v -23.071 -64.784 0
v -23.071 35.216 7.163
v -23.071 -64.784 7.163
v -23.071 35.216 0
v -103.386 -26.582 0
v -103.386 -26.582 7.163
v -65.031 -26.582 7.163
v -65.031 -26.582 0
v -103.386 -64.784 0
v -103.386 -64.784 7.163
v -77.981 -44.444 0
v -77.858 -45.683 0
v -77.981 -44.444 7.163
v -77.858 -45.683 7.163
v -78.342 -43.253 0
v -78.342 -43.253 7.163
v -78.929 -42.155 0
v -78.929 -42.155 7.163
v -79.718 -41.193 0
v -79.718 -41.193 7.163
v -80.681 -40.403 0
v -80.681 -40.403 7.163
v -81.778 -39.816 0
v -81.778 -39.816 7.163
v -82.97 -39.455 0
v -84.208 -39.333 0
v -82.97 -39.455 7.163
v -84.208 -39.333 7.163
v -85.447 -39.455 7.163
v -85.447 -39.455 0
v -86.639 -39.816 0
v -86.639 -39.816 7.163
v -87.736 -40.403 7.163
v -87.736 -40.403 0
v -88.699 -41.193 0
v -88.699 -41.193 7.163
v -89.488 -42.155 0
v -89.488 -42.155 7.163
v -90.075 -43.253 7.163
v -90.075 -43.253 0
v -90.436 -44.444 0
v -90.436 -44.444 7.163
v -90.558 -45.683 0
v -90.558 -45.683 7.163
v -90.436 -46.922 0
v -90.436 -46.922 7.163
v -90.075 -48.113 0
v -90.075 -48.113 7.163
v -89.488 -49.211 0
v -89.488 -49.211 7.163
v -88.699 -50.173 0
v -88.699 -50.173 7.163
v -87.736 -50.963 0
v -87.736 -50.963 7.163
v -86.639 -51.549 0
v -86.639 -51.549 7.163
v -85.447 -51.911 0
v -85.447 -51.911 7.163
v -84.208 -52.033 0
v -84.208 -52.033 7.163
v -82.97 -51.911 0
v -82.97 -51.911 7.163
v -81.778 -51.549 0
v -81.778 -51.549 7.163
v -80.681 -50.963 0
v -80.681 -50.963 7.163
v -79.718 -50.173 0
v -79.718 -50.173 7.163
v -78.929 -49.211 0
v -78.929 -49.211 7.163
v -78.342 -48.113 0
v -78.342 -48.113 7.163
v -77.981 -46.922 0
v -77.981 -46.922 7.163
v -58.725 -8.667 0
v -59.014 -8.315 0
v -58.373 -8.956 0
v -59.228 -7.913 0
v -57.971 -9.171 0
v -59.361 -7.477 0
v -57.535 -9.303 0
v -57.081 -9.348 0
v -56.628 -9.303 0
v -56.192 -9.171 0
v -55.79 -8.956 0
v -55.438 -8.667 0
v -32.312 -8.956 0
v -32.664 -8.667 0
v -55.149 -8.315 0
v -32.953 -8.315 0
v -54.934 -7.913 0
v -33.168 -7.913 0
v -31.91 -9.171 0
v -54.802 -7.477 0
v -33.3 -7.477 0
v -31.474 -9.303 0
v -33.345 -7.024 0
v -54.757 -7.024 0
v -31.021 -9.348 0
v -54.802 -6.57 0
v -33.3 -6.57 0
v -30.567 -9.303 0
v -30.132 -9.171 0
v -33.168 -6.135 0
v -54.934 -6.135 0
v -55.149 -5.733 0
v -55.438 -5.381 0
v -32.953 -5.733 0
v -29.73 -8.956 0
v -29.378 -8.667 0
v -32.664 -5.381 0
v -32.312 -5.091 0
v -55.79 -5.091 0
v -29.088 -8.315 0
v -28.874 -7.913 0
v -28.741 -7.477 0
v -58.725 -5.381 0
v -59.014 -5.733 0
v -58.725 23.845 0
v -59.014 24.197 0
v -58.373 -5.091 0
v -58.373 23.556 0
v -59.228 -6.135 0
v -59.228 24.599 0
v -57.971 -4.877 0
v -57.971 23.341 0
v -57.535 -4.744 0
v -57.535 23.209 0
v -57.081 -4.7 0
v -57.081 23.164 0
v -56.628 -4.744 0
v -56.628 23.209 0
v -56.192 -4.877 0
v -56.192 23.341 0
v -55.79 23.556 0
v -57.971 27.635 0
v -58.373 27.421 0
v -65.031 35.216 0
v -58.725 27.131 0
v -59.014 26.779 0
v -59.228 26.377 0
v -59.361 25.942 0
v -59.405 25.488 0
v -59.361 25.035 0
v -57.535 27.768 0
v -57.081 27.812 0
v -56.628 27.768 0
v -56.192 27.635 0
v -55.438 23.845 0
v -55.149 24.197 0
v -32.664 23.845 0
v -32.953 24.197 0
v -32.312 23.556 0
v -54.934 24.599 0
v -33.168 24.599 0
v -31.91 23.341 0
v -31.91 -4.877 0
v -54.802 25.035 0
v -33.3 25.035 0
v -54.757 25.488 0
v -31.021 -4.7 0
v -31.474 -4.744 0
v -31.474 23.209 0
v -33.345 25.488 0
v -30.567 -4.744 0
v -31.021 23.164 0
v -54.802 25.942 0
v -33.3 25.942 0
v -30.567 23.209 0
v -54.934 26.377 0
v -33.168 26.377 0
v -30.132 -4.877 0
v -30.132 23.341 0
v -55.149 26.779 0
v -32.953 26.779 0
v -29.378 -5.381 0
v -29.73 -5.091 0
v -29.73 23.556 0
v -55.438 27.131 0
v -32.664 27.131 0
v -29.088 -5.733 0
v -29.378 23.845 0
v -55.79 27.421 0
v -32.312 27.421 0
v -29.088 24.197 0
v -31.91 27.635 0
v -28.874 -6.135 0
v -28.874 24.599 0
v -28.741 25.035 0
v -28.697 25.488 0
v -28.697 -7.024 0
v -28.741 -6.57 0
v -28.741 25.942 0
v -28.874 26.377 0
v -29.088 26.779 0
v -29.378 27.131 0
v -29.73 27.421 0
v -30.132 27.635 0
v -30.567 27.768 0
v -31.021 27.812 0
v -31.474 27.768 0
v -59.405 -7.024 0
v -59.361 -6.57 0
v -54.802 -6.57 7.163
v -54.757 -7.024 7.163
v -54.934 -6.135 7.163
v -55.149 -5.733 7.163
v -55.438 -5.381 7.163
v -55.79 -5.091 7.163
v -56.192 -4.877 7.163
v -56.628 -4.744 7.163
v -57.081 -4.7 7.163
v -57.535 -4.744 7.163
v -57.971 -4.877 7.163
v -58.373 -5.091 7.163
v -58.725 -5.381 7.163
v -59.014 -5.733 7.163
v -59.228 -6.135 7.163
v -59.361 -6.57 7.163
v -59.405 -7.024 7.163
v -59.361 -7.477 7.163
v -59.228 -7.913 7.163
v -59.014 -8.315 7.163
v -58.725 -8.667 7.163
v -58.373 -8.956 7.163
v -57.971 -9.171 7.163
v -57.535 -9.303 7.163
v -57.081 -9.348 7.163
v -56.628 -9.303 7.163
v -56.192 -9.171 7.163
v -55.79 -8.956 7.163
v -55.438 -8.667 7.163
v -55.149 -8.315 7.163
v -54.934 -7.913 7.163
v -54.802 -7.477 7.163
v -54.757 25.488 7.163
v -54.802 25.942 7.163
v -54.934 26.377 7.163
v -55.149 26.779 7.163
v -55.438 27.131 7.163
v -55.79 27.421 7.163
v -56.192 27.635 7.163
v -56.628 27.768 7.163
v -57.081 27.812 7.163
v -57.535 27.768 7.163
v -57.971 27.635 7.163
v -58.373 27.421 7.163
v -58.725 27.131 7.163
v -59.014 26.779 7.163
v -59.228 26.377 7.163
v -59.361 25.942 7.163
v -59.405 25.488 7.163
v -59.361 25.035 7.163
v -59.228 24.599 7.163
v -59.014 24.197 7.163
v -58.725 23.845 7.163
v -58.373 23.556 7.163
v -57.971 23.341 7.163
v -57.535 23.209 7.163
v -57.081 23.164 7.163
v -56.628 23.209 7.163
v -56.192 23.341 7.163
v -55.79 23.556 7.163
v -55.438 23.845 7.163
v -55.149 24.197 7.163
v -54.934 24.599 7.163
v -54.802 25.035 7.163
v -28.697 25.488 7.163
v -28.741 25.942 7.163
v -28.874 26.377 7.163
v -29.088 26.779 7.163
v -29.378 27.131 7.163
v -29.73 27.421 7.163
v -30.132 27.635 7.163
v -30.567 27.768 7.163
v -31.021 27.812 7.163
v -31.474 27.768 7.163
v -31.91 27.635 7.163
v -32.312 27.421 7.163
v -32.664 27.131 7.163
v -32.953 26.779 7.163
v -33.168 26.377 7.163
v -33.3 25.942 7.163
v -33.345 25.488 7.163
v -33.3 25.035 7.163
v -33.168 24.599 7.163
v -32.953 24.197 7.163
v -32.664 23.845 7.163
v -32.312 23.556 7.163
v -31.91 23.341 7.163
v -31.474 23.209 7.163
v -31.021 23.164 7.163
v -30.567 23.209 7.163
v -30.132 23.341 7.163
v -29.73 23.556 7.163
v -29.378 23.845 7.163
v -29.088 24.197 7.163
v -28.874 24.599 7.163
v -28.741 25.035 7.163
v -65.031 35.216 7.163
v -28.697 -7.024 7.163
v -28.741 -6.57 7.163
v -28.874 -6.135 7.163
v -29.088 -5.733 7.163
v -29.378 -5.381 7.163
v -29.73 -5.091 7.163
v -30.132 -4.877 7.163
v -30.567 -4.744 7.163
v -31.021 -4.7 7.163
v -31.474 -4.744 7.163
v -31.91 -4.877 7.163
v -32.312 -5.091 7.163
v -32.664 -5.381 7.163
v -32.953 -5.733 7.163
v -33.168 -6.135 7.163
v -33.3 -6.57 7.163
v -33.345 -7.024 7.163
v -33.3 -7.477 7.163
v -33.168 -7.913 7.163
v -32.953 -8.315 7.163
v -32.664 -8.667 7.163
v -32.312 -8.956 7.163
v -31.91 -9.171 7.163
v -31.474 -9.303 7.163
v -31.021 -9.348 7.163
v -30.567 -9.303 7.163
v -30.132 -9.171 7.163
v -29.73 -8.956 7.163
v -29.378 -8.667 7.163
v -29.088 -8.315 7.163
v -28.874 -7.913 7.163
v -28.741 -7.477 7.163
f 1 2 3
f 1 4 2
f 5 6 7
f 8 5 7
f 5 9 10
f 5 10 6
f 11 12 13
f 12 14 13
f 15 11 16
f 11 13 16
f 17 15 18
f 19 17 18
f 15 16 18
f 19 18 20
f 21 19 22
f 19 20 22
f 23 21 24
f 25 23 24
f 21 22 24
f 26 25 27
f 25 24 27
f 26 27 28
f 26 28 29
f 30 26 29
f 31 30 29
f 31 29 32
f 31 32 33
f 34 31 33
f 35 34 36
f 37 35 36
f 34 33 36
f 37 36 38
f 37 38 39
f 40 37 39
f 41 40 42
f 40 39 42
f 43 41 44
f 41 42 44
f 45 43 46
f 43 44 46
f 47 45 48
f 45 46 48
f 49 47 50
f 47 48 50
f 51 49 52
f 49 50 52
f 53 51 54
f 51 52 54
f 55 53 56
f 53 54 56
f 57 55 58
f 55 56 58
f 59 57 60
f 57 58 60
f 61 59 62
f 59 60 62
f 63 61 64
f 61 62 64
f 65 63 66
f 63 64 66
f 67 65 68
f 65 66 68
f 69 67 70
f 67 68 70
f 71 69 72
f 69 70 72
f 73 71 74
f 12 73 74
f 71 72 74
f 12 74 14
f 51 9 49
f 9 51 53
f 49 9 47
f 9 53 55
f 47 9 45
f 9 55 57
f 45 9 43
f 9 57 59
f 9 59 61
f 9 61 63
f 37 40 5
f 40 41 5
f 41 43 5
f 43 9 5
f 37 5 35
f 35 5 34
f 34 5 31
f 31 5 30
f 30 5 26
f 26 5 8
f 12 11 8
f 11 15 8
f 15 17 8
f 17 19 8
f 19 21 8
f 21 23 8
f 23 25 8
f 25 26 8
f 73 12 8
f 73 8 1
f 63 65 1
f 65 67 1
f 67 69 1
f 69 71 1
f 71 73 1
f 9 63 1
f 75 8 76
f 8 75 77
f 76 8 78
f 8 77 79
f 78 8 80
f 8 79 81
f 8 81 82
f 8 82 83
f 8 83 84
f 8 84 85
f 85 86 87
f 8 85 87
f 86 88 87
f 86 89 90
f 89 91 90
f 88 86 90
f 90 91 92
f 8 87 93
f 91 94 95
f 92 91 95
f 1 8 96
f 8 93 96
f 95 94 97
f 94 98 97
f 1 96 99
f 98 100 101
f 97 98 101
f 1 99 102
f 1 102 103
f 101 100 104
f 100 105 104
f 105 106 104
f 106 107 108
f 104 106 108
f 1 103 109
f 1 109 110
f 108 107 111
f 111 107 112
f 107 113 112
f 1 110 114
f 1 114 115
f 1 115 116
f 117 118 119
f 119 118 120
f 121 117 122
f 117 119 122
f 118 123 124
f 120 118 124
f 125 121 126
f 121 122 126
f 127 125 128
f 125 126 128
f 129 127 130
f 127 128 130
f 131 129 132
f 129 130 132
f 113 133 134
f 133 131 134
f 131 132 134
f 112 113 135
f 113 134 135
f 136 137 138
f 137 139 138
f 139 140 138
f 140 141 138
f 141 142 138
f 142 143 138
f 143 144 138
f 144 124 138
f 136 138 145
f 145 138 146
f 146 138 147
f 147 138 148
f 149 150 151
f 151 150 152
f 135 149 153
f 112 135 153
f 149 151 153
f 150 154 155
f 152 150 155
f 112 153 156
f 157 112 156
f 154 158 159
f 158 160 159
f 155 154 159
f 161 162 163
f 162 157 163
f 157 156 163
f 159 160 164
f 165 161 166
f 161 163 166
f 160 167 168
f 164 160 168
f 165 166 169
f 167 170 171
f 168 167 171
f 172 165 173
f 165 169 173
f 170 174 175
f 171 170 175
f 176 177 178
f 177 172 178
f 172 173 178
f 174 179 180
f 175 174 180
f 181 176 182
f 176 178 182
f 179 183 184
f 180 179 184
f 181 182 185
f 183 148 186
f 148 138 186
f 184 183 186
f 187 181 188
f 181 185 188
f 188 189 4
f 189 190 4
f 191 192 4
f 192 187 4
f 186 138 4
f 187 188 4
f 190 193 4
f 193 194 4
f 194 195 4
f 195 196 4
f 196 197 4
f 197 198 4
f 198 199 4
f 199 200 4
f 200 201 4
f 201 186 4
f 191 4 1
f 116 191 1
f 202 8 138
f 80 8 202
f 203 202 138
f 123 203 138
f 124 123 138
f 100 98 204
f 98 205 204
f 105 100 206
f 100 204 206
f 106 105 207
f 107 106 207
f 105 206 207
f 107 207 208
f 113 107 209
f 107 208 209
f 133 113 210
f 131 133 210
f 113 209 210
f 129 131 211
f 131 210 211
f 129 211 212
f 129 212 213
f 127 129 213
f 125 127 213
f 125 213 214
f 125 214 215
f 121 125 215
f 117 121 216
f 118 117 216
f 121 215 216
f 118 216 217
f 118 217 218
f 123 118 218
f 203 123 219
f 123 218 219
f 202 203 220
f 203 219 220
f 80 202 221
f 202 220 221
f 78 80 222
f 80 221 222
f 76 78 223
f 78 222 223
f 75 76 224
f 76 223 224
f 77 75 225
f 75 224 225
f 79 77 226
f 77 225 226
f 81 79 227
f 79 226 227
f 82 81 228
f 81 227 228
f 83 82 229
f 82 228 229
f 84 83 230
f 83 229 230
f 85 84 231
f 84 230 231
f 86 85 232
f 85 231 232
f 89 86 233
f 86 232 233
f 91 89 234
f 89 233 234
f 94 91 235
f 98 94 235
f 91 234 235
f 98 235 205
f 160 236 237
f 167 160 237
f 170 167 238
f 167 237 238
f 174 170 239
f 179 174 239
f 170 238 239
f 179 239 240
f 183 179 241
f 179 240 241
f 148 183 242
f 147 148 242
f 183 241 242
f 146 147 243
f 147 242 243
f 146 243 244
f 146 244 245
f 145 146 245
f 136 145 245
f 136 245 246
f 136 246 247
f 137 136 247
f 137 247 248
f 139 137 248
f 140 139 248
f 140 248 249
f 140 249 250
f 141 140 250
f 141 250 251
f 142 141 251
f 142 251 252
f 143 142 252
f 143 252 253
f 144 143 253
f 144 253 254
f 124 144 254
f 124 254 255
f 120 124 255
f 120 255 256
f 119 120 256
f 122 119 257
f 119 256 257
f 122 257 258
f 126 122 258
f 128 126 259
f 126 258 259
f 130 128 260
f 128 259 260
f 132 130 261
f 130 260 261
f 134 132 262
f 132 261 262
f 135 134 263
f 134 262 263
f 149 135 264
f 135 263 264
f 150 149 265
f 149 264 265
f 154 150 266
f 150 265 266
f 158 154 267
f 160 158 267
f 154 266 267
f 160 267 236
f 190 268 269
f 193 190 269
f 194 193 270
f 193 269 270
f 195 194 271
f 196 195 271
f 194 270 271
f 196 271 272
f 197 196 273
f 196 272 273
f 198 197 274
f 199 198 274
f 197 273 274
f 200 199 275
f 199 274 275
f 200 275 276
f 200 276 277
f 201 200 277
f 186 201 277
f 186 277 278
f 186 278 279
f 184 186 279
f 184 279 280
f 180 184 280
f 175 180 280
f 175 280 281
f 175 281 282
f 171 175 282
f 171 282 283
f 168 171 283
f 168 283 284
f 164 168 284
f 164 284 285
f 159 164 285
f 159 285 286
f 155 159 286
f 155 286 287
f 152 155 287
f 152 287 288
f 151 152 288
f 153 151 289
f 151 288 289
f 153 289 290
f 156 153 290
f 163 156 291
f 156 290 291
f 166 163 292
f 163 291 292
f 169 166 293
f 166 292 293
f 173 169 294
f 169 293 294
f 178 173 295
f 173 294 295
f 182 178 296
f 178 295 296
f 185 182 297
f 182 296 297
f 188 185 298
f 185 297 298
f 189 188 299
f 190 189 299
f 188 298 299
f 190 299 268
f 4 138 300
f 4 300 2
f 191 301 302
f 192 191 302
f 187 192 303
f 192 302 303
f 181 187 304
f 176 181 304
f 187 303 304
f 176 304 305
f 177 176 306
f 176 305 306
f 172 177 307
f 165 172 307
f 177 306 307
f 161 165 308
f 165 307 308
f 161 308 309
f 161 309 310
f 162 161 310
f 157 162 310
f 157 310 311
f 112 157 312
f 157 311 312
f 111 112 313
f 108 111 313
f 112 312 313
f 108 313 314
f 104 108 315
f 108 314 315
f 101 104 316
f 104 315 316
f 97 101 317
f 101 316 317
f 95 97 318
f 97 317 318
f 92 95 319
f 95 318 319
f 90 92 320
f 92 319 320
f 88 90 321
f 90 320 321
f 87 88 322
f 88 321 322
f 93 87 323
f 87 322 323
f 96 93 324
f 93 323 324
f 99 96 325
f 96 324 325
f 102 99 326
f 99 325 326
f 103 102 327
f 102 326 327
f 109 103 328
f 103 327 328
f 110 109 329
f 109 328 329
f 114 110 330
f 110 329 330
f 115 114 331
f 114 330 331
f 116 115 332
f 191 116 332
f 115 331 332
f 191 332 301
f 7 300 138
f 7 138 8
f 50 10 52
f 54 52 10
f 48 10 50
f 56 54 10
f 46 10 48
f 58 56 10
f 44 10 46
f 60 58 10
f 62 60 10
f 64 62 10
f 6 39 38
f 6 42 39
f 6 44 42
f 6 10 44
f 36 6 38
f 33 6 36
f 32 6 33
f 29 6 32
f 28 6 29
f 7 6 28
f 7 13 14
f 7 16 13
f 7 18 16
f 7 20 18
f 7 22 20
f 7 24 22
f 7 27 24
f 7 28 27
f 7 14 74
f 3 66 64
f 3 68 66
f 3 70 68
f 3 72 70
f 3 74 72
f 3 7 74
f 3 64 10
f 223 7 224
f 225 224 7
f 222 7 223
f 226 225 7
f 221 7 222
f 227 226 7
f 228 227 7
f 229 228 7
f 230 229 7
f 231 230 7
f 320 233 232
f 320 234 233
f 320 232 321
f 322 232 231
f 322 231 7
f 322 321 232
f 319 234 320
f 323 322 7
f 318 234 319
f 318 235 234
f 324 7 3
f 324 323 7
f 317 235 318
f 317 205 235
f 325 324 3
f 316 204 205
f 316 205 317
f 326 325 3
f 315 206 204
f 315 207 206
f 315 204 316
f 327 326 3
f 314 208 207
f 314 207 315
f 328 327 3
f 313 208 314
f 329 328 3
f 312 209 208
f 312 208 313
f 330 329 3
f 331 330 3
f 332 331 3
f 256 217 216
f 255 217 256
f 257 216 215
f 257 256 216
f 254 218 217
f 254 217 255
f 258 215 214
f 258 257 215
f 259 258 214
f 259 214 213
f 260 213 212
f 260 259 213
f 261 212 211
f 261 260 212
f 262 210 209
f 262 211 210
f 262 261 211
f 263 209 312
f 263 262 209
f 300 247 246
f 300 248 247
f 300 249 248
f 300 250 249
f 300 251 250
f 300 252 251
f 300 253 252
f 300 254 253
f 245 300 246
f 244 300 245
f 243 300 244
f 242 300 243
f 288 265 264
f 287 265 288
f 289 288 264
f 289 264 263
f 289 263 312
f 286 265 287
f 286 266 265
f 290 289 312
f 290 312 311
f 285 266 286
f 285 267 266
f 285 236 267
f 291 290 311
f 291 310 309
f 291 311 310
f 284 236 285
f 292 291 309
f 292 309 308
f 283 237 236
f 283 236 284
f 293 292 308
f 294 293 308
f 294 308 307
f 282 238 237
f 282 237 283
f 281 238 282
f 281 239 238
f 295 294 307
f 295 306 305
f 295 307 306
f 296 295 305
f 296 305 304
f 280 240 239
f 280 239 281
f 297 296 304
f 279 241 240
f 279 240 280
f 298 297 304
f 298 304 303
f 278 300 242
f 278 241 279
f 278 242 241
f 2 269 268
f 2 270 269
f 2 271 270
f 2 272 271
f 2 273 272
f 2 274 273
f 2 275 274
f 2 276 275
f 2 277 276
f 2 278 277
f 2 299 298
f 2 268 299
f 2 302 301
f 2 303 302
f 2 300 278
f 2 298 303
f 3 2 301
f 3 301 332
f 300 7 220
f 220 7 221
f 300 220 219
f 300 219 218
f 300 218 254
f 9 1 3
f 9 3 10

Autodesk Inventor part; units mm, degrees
ref_plane "YZ Plane" through (0, 0, 0) normal (1, 0, 0) x (0, 1, 0)
ref_plane "XZ Plane" through (0, 0, 0) normal (0, 1, 0) x (-1, 0, 0)
ref_plane "XY Plane" through (0, 0, 0) normal (0, 0, 1) x (1, 0, 0)
sketch "Sketch1" plane through (0, 0, 0) normal (0, 0, 1) x (1, 0, 0)
  line L0 (-103.3855, 35.2163) -> (-23.0707, 35.2163)
  line L1 (-23.0707, 35.2163) -> (-23.0707, -64.7835)
  line L2 (-23.0707, -64.7835) -> (-103.3855, -64.7835)
  line L3 (-103.3855, -64.7835) -> (-103.3855, 35.2163)
  dimension "d0" = 80.3148
  dimension "d1" = 99.9998
extrude "Extrusion1" add sketch "Sketch1" along normal blind 7.1628
sketch "Sketch2" plane through (0, 0, 7.1628) normal (0, 0, 1) x (1, 0, 0)
  line L0 (-23.0707, 35.2163) -> (-103.3855, 35.2163) projected
  line L1 (-103.3855, 35.2163) -> (-103.3855, -64.7835) projected
  line L2 (-103.3855, -64.7835) -> (-23.0707, -64.7835) projected
  line L3 (-23.0707, -64.7835) -> (-23.0707, 35.2163) projected
  line L4 (-65.0315, 35.2163) -> (-65.0315, -26.5819)
  line L5 (-103.3855, -26.5819) -> (-65.0315, -26.5819)
  dimension "d4" = 41.9608
  dimension "d5" = 38.2016
extrude "Extrusion2" cut sketch "Sketch2" against normal blind 7.1628 contours L4 L5 L1 L0
sketch "Sketch3" plane through (0, 0, 7.1628) normal (0, 0, 1) x (1, 0, 0)
  line L0 (-23.0707, 35.2163) -> (-65.0315, 35.2163) projected
  line L1 (-65.0315, -26.5819) -> (-65.0315, -64.7835)
  line L2 (-23.0707, -64.7835) -> (-103.3855, -64.7835) projected
  circle A0 centre (-84.2085, -45.6827) radius 6.35
  dimension "d8" = 12.7
extrude "Extrusion3" cut sketch "Sketch3" against normal blind 7.1628
sketch "Sketch4" plane through (0, 0, 7.1628) normal (0, 0, 1) x (1, 0, 0)
  line L0 (-65.0315, -26.5819) -> (-65.0315, 35.2163) projected
  circle A0 centre (-57.0813, 25.4881) radius 2.3241
  circle A1 centre (-31.0209, 25.4881) radius 2.3241
  circle A2 centre (-57.0813, -7.0239) radius 2.3241
  circle A3 centre (-31.0209, -7.0239) radius 2.3241
  dimension "d15" = 4.6482
  dimension "d16" = 4.6482
  dimension "d17" = 4.6482
  dimension "d18" = 4.6482
extrude "Extrusion4" cut sketch "Sketch4" against normal blind 7.1628
properties part number "el torro bracket"
